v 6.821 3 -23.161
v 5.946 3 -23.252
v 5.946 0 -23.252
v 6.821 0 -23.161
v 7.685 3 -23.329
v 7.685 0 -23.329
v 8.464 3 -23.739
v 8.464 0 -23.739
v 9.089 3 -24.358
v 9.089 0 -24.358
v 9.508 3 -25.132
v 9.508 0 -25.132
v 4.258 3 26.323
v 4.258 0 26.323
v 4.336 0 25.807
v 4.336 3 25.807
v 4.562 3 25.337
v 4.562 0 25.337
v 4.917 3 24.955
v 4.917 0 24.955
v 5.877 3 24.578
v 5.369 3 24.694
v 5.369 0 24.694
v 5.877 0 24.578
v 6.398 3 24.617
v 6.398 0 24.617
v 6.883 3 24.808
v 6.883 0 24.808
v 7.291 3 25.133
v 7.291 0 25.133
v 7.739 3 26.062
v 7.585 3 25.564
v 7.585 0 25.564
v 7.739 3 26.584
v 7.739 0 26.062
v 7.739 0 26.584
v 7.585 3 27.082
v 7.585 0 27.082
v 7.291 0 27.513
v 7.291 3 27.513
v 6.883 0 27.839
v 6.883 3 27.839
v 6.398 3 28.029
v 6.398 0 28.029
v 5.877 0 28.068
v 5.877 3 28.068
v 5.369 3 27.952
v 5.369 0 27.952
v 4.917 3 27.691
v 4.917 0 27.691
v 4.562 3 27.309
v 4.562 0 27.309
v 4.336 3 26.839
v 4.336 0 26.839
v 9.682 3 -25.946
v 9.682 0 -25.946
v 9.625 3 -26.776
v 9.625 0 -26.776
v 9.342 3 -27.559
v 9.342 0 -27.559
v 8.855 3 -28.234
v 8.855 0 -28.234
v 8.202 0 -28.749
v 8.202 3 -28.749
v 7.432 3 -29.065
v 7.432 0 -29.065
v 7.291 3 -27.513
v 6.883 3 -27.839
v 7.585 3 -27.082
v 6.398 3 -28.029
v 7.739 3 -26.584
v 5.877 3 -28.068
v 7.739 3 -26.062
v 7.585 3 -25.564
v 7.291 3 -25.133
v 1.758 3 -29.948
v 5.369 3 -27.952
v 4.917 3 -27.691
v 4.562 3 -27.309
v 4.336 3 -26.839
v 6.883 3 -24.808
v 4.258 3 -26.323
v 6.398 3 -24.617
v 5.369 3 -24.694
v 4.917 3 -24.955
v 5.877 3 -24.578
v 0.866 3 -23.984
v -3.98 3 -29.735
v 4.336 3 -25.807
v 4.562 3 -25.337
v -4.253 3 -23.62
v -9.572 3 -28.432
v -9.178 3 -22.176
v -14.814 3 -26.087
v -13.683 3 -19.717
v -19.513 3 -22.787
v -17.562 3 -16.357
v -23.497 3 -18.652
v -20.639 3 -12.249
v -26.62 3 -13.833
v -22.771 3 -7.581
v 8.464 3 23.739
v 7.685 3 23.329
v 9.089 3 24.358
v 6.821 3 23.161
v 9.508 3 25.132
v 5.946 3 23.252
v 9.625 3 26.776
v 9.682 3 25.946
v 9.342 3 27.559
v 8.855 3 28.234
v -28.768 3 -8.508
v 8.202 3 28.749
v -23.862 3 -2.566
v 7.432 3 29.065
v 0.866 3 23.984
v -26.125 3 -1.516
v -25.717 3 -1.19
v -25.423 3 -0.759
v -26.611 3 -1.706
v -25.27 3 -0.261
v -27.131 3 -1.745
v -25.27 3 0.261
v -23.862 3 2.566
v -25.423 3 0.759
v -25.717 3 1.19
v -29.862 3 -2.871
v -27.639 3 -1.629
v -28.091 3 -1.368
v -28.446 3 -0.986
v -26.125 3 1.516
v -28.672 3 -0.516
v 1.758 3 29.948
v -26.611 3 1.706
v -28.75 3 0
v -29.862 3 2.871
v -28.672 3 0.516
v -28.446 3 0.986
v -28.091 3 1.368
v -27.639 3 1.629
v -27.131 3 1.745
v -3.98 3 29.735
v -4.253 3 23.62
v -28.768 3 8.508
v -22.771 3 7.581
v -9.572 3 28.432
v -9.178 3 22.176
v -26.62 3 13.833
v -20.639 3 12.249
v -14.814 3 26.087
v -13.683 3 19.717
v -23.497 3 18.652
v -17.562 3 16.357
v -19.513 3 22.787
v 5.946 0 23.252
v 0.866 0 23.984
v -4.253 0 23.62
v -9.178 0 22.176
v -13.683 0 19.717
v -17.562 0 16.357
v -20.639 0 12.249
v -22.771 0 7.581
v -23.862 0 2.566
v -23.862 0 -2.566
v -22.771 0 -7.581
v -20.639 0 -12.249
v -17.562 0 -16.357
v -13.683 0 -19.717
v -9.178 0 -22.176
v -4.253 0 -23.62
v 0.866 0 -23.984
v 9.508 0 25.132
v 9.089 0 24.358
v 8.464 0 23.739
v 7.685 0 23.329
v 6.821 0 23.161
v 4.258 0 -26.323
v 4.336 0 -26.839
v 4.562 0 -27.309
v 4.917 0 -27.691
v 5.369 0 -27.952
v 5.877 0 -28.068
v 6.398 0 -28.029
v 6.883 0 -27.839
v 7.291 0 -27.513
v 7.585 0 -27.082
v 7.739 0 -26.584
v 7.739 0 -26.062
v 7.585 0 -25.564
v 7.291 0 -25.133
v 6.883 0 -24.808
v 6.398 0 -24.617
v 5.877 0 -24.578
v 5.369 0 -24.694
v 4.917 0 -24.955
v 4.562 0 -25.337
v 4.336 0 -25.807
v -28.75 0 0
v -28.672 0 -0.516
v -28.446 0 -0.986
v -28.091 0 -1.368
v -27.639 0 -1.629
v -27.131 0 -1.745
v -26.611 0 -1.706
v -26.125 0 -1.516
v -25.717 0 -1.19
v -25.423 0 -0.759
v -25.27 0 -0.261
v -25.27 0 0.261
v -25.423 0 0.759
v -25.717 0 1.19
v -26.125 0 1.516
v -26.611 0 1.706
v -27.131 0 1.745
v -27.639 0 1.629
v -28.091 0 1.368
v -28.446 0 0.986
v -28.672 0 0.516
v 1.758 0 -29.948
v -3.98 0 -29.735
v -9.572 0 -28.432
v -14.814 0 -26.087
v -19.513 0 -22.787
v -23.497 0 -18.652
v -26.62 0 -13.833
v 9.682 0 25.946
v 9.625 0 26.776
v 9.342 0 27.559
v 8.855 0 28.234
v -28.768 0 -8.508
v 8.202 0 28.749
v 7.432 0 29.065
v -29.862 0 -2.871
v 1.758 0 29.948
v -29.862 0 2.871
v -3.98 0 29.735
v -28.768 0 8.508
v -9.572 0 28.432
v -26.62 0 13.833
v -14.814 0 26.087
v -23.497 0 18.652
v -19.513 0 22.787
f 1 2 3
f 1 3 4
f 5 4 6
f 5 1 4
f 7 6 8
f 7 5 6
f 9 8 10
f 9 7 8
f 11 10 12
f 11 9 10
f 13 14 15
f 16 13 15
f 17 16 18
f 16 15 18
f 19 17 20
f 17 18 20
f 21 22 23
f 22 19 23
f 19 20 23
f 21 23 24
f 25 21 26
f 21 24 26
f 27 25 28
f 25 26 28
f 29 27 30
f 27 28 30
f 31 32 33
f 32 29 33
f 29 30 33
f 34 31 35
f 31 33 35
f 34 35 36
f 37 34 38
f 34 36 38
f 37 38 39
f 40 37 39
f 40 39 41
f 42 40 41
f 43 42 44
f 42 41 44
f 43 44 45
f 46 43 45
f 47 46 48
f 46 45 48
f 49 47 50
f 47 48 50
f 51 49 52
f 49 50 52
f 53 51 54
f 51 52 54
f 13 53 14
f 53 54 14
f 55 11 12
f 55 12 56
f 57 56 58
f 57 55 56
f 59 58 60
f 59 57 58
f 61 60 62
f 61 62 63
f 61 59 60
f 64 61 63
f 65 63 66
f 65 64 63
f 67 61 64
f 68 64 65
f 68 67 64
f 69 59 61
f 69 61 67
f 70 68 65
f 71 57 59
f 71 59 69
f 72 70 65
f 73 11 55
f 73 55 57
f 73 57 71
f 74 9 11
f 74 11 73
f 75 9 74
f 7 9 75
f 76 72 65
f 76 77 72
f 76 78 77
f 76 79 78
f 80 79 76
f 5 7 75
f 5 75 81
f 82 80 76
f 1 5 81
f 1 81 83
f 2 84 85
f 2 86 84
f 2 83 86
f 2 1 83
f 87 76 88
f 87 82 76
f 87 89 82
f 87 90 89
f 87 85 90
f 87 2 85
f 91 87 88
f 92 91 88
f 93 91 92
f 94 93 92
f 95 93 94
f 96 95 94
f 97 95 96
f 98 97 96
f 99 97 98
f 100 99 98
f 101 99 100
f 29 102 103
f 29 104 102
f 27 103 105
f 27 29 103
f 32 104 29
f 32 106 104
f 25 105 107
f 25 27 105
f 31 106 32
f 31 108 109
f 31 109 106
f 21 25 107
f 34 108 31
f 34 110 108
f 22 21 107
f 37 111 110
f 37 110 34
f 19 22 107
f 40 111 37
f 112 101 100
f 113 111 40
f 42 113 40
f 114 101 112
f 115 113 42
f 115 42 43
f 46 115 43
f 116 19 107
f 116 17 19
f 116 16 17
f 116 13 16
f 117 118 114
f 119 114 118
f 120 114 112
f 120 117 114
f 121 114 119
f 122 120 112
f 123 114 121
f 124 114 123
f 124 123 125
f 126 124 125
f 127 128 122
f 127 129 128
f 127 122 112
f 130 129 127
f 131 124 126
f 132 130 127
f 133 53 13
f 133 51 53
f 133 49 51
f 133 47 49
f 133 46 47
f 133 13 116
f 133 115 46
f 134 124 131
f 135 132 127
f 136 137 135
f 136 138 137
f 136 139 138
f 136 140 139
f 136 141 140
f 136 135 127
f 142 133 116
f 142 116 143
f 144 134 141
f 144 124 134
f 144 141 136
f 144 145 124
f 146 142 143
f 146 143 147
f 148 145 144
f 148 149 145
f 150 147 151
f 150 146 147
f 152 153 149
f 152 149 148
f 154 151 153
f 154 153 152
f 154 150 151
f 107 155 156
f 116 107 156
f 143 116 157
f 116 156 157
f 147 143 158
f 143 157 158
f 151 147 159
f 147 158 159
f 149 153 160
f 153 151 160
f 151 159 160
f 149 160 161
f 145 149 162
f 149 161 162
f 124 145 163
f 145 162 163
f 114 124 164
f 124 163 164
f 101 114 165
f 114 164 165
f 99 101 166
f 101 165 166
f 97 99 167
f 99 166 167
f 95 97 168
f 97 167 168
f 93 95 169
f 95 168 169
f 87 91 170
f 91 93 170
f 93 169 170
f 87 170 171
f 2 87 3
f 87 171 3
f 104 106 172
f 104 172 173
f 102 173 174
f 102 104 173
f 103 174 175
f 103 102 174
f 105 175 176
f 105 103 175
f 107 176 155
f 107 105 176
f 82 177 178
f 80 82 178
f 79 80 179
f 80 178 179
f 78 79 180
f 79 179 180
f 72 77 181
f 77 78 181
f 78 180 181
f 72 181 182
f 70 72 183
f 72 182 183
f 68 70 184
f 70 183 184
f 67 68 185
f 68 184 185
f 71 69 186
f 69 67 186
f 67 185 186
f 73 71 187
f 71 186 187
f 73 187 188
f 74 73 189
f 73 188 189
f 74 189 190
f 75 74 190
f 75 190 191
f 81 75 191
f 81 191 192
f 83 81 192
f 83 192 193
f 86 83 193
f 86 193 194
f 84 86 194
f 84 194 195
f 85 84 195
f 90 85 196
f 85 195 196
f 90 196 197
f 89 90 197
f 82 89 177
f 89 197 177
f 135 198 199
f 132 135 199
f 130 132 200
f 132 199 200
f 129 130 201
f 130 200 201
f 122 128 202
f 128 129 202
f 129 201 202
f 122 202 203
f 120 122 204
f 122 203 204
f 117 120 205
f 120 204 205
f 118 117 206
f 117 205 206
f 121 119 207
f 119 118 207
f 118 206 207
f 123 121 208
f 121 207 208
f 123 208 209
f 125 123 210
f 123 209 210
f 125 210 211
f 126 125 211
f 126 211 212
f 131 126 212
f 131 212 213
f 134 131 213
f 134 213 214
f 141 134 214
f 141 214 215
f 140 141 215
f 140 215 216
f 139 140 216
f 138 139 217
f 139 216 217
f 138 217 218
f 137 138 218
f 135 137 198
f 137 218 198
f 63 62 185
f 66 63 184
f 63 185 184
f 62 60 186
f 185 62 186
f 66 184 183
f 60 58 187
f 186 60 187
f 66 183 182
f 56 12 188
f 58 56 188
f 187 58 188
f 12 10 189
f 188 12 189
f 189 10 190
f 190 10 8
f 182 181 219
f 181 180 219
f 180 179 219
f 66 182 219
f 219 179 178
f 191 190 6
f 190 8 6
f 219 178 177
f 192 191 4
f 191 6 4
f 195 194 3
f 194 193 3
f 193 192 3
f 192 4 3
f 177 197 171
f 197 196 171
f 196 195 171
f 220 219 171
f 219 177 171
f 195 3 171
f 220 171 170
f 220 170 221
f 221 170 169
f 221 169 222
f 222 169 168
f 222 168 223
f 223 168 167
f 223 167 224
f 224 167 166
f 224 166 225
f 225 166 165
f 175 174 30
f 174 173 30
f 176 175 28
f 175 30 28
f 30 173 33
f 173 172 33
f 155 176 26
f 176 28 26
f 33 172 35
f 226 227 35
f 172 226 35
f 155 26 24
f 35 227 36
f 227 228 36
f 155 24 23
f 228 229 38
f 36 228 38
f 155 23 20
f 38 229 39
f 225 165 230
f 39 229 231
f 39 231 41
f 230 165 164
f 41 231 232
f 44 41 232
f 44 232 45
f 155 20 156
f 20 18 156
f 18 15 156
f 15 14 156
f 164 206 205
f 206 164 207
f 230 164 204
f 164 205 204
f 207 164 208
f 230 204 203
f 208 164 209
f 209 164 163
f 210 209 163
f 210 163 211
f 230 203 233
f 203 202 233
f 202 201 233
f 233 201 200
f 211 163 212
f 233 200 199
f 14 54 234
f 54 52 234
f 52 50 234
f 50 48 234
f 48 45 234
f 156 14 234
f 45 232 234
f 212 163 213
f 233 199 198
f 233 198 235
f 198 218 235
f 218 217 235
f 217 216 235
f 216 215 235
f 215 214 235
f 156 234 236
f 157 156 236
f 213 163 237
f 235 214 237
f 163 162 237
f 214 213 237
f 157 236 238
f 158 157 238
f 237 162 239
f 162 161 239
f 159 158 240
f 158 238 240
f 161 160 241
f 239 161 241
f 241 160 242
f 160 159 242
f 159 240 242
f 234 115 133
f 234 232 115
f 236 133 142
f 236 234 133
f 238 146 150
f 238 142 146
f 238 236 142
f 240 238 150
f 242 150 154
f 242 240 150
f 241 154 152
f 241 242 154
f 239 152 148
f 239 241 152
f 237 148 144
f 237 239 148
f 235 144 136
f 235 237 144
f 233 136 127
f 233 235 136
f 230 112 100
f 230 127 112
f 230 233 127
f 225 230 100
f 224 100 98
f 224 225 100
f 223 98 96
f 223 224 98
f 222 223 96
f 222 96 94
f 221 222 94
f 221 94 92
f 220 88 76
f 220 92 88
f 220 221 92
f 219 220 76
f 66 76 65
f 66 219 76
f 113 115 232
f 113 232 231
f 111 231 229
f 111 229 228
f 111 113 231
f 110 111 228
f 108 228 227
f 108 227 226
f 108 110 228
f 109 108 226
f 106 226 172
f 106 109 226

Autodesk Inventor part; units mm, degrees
ref_plane "YZ Plane" through (0, 0, 0) normal (1, 0, 0) x (0, 1, 0)
ref_plane "XZ Plane" through (0, 0, 0) normal (0, 1, 0) x (-1, 0, 0)
ref_plane "XY Plane" through (0, 0, 0) normal (0, 0, 1) x (1, 0, 0)
sketch "Sketch1" plane through (0, 0, 0) normal (0, 1, 0) x (-1, 0, 0)
  arc A0 (-10.5785, -28.0731) -> (-10.5785, 28.0731) centre (0, 0) ccw
  arc A1 (-23.5162, 13.2661) -> (-10.5785, 24.8414) centre (0, 0) ccw construction
  arc A2 (-10.5785, -21.5429) -> (-10.5785, 21.5429) centre (0, 0) ccw
  circle A3 centre (27, 0) radius 1.75
  circle A4 centre (16.8342, 21.1095) radius 1.75
  circle A5 centre (-6.0081, 26.3231) radius 1.75
  circle A6 centre (-24.3262, 11.7149) radius 1.75
  circle A7 centre (-24.3262, -11.7149) radius 1.75
  circle A8 centre (-6.0081, -26.3231) radius 1.75
  circle A9 centre (16.8342, -21.1095) radius 1.75
  line L0 (-10.5785, 28.0731) -> (-8.5262, 22.4344)
  line L1 (-10.5785, 28.0731) -> (-4.578, 28.0731) construction
  line L2 (-10.5785, -28.0731) -> (-8.5262, -22.4344)
  dimension "d2" = 60
  dimension "d3" = 54
  dimension "d4" = 48
  dimension "d5" = 3.5
  dimension "d6" = 360
  dimension "d7" = 70
extrude "Extrusion1" add sketch "Sketch1" along normal blind 3 contours L2 A2 L0 A0 | A4 | A9
fillet "Fillet1" radius 3 4 edges at (10.5785, 1.5, 28.0731) (8.5262, 1.5, 22.4344) (8.5262, 1.5, -22.4344) (10.5785, 1.5, -28.0731)
properties part number "Reverse Lever Ring" material "Copper"
